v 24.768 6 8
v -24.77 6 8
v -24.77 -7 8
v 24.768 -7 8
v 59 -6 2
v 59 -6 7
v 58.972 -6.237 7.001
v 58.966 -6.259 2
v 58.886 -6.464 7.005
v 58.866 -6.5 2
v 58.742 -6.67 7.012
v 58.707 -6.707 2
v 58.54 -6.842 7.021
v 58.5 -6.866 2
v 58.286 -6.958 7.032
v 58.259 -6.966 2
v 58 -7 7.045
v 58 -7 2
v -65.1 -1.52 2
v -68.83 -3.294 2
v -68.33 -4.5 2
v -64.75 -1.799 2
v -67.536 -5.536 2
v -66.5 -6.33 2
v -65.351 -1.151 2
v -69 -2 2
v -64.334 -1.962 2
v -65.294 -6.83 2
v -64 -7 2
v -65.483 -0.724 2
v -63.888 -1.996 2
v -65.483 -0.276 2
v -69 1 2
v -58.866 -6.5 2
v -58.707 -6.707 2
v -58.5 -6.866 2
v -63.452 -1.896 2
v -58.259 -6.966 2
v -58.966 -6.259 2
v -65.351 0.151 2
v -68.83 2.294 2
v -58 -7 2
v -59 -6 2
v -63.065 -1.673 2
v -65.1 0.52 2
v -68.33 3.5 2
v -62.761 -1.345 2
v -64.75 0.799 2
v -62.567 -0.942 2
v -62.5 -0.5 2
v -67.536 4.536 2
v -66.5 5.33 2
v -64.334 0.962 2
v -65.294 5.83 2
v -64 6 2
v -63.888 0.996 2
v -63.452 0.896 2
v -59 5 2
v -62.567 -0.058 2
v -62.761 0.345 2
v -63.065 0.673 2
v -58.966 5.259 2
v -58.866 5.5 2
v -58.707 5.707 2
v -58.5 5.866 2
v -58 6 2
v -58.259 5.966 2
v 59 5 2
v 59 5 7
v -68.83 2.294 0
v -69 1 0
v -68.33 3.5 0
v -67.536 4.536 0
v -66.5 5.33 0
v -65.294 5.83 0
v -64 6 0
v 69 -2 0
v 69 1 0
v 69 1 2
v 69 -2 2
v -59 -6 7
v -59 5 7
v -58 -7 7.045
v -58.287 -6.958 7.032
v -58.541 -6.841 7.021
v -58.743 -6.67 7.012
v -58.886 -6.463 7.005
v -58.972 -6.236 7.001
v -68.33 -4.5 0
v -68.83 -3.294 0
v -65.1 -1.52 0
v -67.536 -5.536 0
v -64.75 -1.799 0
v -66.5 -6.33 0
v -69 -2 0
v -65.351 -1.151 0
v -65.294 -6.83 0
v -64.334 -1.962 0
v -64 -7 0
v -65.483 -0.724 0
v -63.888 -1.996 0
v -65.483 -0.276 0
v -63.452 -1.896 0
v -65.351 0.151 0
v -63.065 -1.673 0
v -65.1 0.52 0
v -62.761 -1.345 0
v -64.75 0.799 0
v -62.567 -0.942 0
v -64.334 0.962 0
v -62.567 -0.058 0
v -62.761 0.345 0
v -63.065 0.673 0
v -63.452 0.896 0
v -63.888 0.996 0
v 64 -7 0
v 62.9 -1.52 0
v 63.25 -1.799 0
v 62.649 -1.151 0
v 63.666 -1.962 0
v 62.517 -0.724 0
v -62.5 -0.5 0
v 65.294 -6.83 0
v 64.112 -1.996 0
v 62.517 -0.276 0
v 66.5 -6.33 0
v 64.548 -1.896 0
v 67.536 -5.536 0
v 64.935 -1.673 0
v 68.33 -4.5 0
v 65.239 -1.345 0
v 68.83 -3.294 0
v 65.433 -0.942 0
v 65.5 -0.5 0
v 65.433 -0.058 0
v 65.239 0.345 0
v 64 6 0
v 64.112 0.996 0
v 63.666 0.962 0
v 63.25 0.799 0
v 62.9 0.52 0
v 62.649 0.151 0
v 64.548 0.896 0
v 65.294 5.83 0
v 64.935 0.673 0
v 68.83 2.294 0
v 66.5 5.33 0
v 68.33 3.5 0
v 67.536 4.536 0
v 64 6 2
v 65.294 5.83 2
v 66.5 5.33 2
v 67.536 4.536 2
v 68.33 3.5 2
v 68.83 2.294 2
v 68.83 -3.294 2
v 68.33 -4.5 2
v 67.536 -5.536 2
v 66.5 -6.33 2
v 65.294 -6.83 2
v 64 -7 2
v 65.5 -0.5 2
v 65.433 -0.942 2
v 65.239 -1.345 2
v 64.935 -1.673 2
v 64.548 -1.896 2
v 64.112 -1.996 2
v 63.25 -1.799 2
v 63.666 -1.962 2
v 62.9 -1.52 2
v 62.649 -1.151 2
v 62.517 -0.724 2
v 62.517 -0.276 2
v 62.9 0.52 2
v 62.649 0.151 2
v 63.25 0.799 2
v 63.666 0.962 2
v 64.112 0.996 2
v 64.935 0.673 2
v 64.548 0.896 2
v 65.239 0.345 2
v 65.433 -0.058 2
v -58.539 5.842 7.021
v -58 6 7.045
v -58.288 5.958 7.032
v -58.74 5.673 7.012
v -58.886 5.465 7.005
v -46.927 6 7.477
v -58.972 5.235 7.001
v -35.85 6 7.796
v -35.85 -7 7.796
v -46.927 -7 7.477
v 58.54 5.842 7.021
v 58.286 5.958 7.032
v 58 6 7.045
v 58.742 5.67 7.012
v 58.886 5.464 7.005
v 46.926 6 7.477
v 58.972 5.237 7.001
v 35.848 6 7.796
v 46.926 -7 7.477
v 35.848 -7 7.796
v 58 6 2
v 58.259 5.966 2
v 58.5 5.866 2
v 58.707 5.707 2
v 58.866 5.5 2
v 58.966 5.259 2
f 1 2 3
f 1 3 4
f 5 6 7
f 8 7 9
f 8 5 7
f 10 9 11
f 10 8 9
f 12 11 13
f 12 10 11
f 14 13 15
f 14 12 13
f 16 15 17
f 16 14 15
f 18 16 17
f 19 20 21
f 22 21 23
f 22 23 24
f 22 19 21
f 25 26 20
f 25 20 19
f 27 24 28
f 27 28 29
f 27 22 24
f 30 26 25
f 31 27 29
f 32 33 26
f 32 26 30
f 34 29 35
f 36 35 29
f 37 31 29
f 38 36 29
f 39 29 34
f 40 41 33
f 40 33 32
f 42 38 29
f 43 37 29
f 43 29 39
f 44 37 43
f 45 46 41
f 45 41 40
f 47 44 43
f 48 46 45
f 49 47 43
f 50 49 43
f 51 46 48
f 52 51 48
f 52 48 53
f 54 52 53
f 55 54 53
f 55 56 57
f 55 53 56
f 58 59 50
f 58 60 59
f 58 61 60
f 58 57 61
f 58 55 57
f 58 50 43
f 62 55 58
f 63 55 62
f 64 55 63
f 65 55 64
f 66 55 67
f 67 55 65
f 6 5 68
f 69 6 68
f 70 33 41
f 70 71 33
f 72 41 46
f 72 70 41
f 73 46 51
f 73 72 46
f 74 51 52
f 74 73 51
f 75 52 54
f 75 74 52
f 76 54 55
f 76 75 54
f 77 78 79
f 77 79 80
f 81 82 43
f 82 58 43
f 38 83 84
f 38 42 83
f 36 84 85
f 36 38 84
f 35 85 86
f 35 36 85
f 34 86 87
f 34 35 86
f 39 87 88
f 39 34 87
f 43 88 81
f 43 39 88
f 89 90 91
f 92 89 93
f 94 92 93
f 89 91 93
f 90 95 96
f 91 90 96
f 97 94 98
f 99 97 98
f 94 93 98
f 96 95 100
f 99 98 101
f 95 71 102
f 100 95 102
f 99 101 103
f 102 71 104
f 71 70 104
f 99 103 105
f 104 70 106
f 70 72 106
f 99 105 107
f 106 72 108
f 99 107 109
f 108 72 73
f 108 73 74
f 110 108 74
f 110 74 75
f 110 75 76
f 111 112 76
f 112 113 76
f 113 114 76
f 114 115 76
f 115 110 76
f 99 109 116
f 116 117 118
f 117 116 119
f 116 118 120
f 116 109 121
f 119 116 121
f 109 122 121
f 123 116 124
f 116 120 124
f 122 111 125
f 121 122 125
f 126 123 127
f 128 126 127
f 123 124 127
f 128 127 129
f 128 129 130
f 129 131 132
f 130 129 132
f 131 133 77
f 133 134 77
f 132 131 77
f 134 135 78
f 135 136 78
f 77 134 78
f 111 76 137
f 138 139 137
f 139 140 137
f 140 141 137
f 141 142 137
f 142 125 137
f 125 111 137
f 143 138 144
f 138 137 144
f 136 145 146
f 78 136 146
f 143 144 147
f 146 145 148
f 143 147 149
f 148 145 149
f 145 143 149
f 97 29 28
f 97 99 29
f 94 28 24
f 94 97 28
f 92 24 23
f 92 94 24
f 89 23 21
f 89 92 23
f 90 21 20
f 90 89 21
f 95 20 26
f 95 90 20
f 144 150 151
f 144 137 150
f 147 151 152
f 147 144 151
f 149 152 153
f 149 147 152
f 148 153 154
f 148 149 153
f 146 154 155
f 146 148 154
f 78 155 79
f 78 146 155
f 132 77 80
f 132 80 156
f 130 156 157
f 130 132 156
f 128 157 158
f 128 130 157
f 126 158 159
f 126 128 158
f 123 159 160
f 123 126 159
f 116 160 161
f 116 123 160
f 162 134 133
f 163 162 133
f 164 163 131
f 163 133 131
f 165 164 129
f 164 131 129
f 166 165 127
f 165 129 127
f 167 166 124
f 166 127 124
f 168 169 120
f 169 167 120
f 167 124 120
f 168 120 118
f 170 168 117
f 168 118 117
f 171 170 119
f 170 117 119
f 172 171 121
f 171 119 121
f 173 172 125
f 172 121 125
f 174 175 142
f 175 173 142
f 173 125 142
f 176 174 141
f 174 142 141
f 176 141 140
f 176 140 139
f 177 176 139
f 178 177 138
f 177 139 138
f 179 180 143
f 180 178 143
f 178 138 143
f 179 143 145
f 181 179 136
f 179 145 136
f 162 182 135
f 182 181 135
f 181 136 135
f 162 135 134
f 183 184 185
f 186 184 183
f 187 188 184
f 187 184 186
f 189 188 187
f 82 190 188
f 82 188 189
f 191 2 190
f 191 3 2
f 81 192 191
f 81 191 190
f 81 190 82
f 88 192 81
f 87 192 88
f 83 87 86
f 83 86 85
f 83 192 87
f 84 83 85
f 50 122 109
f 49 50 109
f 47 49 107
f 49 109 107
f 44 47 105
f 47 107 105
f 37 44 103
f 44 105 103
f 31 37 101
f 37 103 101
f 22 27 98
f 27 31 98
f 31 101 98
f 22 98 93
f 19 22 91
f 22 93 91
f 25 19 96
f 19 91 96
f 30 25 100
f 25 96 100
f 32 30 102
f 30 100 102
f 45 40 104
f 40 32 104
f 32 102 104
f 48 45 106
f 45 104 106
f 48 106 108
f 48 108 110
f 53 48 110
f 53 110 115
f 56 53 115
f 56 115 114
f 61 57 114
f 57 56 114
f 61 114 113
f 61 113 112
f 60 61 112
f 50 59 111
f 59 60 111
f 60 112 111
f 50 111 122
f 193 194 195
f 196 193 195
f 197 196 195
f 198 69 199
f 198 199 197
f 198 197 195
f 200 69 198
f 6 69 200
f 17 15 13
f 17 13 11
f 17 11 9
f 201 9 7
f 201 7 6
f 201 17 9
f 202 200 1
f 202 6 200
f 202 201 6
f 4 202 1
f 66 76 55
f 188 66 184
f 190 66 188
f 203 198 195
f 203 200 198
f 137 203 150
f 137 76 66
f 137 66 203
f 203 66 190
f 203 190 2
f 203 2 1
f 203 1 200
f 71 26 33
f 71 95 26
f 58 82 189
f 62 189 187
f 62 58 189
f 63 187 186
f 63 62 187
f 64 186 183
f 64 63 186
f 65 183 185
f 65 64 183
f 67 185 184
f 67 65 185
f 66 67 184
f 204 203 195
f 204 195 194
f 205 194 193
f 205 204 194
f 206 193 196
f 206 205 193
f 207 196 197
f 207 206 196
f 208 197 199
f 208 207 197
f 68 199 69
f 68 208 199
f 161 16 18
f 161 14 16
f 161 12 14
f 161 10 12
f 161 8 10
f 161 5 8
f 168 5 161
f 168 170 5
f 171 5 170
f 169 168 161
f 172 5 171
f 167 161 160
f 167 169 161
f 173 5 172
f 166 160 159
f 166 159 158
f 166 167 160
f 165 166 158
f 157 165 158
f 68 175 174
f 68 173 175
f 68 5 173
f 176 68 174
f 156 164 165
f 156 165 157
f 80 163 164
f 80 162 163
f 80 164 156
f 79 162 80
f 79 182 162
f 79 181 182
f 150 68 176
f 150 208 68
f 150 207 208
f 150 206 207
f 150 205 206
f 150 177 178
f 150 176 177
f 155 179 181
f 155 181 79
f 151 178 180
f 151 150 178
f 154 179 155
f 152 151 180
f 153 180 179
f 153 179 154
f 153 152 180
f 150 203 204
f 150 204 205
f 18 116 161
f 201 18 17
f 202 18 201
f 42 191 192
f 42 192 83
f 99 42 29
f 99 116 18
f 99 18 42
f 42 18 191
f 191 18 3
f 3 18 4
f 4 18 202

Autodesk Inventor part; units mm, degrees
ref_plane "YZ Plane" through (0, 0, 0) normal (1, 0, 0) x (0, 1, 0)
ref_plane "XZ Plane" through (0, 0, 0) normal (0, 1, 0) x (-1, 0, 0)
ref_plane "XY Plane" through (0, 0, 0) normal (0, 0, 1) x (1, 0, 0)
sketch "Base" plane through (0, 0, 0) normal (0, 0, 1) x (1, 0, 0)
  line L0 (-64, -0.5) -> (64, -0.5) construction
  circle A0 centre (-64, -0.5) radius 1.5
  circle A1 centre (64, -0.5) radius 1.5
  line L1 (-64, 6) -> (64, 6)
  line L2 (69, 1) -> (69, -2)
  line L3 (64, -7) -> (-64, -7)
  line L4 (-69, -2) -> (-69, 1)
  line L5 (-59, 6) -> (-59, -7) construction
  line L6 (59, 6) -> (59, -7) construction
  arc A2 (-64, 6) -> (-69, 1) centre (-64, 1) ccw
  arc A3 (-69, -2) -> (-64, -7) centre (-64, -2) ccw
  arc A4 (69, 1) -> (64, 6) centre (64, 1) ccw
  arc A5 (64, -7) -> (69, -2) centre (64, -2) ccw
  point P0 (0, 0)
  dimension "d0" = 128
  dimension "d1" = 3
  dimension "d2" = 3
  dimension "d3" = 5
  dimension "d4" = 5
  dimension "d5" = 5
  dimension "d6" = 5
  dimension "d7" = 5
  dimension "d8" = 6.5
  dimension "d9" = 6.5
extrude "BaseFeature" add sketch "Base" along normal blind 2
sketch "Sketch2" plane through (0, 0, 2) normal (0, 0, 1) x (1, 0, 0)
  line L0 (-59, 6) -> (-59, -7) construction
  line L1 (59, 6) -> (59, -7) construction
  line L2 (58, 6) -> (-58, 6)
  line L3 (64, 6) -> (-64, 6) construction
  line L4 (-59, 5) -> (-59, -6)
  line L5 (-58, -7) -> (58, -7)
  line L6 (59, -6) -> (59, 5)
  arc A0 (-58, 6) -> (-59, 5) centre (-58, 5) ccw
  arc A1 (-59, -6) -> (-58, -7) centre (-58, -6) ccw
  arc A2 (59, 5) -> (58, 6) centre (58, 5) ccw
  arc A3 (58, -7) -> (59, -6) centre (58, -6) ccw
  point P0 (0, 0)
  dimension "d12" = 1
  dimension "d13" = 1
extrude "Extrusion2" add sketch "Sketch2" along normal blind 6
sketch "Sketch3" plane through (-64, -7, 0) normal (0, -1, 0) x (1, 0, 0)
  line L0 (0, 0) -> (128, 0) construction
  line L1 (128, 0) -> (128, 2) construction
  line L2 (122, 2) -> (128, 2) construction
  line L3 (6, 8) -> (122, 8) construction
  line L4 (0, 2) -> (6, 2) construction
  line L5 (0, 0) -> (0, 2) construction
  line L6 (64, 0) -> (64, 8.0447) construction
  line L7 (6, 8) -> (122, 8) construction
  arc A0 (64, 8.0447) -> (5, 7) centre (53.5583, -1068.8352) ccw
  arc A1 (123, 7) -> (64, 8.0447) centre (74.4417, -1068.8352) ccw
  line L8 (5, 2) -> (5, 8) projected
  line L9 (123, 2) -> (123, 8) projected
  line L10 (123, 8) -> (5, 8)
  point P0 (88.7678, 8)
  point P1 (39.2322, 8)
  dimension "d17" = 1076.9305
  dimension "d22" = 1
  dimension "d23" = 1
extrude "Extrusion4" cut sketch "Sketch3" against normal through all contours L10 L9 A1 | A0 L8 L10
equation "\"d9\" = d8"
properties part number "MidiPickup"
